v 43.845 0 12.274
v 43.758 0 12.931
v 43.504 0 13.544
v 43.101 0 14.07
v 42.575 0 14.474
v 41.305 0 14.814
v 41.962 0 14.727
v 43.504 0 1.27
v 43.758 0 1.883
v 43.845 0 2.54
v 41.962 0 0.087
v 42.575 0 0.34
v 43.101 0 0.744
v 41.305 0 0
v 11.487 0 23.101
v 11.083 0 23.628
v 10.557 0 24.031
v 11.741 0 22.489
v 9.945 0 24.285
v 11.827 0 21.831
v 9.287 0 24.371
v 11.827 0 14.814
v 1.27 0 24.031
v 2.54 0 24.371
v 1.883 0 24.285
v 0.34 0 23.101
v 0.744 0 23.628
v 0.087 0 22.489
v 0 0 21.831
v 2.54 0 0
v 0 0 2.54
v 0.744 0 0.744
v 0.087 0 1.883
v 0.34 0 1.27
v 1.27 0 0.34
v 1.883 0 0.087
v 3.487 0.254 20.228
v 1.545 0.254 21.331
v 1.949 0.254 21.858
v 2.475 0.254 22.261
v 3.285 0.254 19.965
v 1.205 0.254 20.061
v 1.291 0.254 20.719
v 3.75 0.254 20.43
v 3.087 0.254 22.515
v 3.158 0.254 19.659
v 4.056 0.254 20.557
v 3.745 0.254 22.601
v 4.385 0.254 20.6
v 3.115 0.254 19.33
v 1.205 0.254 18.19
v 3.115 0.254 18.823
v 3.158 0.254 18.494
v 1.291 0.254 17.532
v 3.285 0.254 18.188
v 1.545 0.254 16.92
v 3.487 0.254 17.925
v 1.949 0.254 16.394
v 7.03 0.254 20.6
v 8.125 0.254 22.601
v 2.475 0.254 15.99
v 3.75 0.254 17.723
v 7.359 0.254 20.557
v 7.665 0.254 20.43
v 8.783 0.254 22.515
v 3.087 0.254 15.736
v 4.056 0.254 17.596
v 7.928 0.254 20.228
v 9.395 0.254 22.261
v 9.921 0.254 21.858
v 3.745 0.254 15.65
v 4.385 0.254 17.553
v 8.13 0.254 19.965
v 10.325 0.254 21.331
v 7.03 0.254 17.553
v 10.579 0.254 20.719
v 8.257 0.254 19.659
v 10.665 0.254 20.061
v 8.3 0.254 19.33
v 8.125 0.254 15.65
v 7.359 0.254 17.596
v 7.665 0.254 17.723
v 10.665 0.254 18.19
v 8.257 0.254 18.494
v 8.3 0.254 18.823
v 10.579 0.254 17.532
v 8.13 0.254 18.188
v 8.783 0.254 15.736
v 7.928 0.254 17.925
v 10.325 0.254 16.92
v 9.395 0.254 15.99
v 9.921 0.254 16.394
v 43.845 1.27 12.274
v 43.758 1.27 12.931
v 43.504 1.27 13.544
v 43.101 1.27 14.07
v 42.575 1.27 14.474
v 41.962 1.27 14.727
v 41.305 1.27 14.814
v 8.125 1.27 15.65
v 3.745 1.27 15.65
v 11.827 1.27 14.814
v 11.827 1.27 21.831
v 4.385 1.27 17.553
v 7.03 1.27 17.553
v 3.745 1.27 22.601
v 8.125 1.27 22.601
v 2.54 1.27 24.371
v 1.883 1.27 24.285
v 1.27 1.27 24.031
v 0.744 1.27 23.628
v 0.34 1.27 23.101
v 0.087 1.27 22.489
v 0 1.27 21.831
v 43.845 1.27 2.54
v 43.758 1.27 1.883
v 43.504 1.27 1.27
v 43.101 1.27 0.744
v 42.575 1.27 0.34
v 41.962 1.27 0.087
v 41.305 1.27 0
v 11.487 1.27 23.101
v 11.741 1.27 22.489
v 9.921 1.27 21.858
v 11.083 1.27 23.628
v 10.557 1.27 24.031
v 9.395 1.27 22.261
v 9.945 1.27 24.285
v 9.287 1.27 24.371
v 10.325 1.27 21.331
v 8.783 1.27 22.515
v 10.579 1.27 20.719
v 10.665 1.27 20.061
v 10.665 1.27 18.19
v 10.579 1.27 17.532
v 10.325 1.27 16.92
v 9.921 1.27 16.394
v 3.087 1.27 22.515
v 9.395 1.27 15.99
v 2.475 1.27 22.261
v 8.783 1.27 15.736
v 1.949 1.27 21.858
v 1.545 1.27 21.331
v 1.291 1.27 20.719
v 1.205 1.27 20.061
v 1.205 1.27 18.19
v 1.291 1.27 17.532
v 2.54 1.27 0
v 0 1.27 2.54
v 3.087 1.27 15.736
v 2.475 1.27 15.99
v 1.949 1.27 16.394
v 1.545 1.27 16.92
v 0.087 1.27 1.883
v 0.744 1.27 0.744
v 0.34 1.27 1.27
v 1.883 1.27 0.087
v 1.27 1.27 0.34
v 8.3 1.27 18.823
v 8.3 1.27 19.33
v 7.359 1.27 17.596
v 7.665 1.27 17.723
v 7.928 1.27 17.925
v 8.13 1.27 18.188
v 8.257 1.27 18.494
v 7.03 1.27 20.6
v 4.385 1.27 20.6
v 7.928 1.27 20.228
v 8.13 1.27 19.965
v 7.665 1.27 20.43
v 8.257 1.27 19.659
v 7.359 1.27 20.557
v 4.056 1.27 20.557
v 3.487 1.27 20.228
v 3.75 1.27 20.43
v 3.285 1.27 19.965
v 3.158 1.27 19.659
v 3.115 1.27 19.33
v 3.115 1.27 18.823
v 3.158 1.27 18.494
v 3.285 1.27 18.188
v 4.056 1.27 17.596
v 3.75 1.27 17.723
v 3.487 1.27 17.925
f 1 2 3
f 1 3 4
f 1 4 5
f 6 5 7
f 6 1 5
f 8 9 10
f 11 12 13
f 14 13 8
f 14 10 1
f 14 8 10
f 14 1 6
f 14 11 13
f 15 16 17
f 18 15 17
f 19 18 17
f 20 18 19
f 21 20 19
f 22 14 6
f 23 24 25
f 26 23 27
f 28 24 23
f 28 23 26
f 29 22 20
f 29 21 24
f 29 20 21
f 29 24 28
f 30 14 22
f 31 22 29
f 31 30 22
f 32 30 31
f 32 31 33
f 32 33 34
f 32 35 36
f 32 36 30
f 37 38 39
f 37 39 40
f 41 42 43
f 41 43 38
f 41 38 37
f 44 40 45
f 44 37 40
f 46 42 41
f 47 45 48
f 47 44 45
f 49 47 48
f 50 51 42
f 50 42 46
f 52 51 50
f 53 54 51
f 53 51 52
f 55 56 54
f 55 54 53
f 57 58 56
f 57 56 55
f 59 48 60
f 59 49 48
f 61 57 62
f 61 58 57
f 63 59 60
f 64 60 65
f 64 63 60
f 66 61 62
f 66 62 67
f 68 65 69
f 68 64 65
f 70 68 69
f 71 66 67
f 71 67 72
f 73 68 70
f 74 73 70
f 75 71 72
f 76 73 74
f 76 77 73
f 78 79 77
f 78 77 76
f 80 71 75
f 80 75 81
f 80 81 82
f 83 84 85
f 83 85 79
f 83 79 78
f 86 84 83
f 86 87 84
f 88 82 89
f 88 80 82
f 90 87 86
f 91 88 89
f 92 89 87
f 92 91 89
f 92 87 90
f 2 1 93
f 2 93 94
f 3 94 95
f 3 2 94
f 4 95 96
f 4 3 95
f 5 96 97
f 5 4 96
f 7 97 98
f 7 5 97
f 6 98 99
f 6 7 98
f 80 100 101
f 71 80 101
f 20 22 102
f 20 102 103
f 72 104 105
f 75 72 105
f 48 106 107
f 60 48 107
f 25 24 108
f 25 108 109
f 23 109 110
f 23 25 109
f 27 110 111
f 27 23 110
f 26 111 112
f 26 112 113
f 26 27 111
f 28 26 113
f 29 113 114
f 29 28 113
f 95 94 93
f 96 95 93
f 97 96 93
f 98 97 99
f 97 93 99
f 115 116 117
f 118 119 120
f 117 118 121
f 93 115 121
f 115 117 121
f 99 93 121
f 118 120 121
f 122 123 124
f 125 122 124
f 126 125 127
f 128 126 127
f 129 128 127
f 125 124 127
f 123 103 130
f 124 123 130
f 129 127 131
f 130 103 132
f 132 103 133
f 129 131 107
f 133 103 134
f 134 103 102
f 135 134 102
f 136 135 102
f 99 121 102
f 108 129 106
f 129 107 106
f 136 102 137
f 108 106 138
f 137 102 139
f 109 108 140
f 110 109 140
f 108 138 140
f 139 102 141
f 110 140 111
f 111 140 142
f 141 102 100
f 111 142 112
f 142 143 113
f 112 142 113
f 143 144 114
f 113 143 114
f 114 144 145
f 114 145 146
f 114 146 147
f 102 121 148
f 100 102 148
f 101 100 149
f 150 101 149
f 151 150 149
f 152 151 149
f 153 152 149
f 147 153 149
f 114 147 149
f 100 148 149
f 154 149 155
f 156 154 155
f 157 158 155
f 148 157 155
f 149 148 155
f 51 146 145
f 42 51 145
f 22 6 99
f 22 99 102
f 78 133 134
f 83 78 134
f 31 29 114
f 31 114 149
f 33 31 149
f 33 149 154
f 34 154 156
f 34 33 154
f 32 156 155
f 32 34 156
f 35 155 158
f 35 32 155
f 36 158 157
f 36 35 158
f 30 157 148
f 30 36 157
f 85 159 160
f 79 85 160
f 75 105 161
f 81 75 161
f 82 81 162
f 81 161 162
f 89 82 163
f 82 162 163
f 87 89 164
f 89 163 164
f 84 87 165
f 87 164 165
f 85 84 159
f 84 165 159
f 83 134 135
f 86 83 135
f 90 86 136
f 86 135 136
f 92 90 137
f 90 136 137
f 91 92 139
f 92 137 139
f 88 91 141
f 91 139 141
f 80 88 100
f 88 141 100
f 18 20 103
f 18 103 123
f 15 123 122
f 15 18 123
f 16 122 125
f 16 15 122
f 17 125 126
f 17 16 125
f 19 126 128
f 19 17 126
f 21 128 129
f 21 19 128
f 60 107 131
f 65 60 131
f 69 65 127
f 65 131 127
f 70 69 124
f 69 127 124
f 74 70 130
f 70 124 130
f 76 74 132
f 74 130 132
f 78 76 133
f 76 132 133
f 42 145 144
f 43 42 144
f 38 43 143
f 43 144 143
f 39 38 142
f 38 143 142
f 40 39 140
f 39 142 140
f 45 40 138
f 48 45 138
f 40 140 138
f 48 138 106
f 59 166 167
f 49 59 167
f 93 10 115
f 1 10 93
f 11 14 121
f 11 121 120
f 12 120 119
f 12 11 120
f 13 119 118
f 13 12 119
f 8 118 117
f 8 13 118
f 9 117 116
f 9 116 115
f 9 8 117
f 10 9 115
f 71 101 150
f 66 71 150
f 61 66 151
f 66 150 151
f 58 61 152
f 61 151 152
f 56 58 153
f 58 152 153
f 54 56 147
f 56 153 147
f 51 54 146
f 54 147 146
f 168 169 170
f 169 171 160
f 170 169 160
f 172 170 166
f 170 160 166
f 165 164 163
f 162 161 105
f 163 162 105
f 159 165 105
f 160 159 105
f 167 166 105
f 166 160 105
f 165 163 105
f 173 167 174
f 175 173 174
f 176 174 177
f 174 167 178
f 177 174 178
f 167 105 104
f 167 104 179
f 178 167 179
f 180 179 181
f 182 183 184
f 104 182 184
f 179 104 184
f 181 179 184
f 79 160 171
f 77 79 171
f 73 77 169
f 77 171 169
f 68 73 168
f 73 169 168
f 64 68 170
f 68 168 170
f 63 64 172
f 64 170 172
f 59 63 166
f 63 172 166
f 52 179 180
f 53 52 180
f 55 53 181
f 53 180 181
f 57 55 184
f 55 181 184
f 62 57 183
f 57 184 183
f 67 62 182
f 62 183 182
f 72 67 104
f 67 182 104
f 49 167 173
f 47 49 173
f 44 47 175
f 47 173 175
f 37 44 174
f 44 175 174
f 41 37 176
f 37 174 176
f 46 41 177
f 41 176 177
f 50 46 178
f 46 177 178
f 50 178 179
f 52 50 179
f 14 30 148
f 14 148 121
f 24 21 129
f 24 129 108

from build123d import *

# Parameters (mm, degrees)
BOSS_EXTRUDE1_DEPTH = 1.27
CUT_EXTRUDE1_DEPTH  = 1.016


with BuildPart() as part:
    # Sketch1 → Boss-Extrude1 (new body)
    with BuildSketch(Plane(origin=(0, 0, 0), x_dir=(1, 0, 0), z_dir=(0, 1, 0))):
        with BuildLine():
            Line((2.54, 0), (41.304776771, 0))
            ThreePointArc((41.304776771, 0), (43.100827995, -0.743948776), (43.844776771, -2.54))
            Line((43.844776771, -2.54), (43.844776771, -12.274039018))
            ThreePointArc((43.844776771, -12.274039018), (43.100827995, -14.070090242), (41.304776771, -14.814039018))
            Line((41.304776771, -14.814039018), (11.827337603, -14.814039018))
            Line((11.827337603, -14.814039018), (11.827337603, -21.831483546))
            ThreePointArc((11.827337603, -21.831483546), (11.083388827, -23.62753477), (9.287337603, -24.371483546))
            Line((9.287337603, -24.371483546), (2.54, -24.371483546))
            ThreePointArc((2.54, -24.371483546), (0.743948776, -23.62753477), (0, -21.831483546))
            Line((0, -21.831483546), (0, -14.814039018))
            Line((0, -14.814039018), (0, -2.54))
            ThreePointArc((0, -2.54), (0.743948776, -0.743948776), (2.54, 0))
        make_face()
    extrude(amount=BOSS_EXTRUDE1_DEPTH)

    # Sketch2 → Cut-Extrude1 (cut)
    with BuildSketch(Plane(origin=(0, 1.27, 0), x_dir=(1, 0, 0), z_dir=(0, 1, 0))):
        with BuildLine():
            Line((8.125200896, -15.6495751), (3.744615047, -15.6495751))
            ThreePointArc((3.744615047, -15.6495751), (1.948563823, -16.393523876), (1.204615047, -18.1895751))
            Line((1.204615047, -18.1895751), (1.204615047, -20.061482924))
            ThreePointArc((1.204615047, -20.061482924), (1.948563823, -21.857534148), (3.744615047, -22.601482924))
            Line((3.744615047, -22.601482924), (8.125200896, -22.601482924))
            ThreePointArc((8.125200896, -22.601482924), (9.921252121, -21.857534148), (10.665200896, -20.061482924))
            Line((10.665200896, -20.061482924), (10.665200896, -18.1895751))
            ThreePointArc((10.665200896, -18.1895751), (9.921252121, -16.393523876), (8.125200896, -15.6495751))
        make_face()
        with BuildLine():
            Line((4.384925651, -17.552804899), (7.030054434, -17.552804899))
            ThreePointArc((7.030054434, -17.552804899), (7.928080046, -17.924779287), (8.300054434, -18.822804899))
            Line((8.300054434, -18.822804899), (8.300054434, -19.330205148))
            ThreePointArc((8.300054434, -19.330205148), (7.928080046, -20.228230761), (7.030054434, -20.600205148))
            Line((7.030054434, -20.600205148), (4.384925651, -20.600205148))
            ThreePointArc((4.384925651, -20.600205148), (3.486900039, -20.228230761), (3.114925651, -19.330205148))
            Line((3.114925651, -19.330205148), (3.114925651, -18.822804899))
            ThreePointArc((3.114925651, -18.822804899), (3.486900039, -17.924779287), (4.384925651, -17.552804899))
        make_face(mode=Mode.SUBTRACT)
    extrude(amount=-CUT_EXTRUDE1_DEPTH, mode=Mode.SUBTRACT)


solid = part.part
